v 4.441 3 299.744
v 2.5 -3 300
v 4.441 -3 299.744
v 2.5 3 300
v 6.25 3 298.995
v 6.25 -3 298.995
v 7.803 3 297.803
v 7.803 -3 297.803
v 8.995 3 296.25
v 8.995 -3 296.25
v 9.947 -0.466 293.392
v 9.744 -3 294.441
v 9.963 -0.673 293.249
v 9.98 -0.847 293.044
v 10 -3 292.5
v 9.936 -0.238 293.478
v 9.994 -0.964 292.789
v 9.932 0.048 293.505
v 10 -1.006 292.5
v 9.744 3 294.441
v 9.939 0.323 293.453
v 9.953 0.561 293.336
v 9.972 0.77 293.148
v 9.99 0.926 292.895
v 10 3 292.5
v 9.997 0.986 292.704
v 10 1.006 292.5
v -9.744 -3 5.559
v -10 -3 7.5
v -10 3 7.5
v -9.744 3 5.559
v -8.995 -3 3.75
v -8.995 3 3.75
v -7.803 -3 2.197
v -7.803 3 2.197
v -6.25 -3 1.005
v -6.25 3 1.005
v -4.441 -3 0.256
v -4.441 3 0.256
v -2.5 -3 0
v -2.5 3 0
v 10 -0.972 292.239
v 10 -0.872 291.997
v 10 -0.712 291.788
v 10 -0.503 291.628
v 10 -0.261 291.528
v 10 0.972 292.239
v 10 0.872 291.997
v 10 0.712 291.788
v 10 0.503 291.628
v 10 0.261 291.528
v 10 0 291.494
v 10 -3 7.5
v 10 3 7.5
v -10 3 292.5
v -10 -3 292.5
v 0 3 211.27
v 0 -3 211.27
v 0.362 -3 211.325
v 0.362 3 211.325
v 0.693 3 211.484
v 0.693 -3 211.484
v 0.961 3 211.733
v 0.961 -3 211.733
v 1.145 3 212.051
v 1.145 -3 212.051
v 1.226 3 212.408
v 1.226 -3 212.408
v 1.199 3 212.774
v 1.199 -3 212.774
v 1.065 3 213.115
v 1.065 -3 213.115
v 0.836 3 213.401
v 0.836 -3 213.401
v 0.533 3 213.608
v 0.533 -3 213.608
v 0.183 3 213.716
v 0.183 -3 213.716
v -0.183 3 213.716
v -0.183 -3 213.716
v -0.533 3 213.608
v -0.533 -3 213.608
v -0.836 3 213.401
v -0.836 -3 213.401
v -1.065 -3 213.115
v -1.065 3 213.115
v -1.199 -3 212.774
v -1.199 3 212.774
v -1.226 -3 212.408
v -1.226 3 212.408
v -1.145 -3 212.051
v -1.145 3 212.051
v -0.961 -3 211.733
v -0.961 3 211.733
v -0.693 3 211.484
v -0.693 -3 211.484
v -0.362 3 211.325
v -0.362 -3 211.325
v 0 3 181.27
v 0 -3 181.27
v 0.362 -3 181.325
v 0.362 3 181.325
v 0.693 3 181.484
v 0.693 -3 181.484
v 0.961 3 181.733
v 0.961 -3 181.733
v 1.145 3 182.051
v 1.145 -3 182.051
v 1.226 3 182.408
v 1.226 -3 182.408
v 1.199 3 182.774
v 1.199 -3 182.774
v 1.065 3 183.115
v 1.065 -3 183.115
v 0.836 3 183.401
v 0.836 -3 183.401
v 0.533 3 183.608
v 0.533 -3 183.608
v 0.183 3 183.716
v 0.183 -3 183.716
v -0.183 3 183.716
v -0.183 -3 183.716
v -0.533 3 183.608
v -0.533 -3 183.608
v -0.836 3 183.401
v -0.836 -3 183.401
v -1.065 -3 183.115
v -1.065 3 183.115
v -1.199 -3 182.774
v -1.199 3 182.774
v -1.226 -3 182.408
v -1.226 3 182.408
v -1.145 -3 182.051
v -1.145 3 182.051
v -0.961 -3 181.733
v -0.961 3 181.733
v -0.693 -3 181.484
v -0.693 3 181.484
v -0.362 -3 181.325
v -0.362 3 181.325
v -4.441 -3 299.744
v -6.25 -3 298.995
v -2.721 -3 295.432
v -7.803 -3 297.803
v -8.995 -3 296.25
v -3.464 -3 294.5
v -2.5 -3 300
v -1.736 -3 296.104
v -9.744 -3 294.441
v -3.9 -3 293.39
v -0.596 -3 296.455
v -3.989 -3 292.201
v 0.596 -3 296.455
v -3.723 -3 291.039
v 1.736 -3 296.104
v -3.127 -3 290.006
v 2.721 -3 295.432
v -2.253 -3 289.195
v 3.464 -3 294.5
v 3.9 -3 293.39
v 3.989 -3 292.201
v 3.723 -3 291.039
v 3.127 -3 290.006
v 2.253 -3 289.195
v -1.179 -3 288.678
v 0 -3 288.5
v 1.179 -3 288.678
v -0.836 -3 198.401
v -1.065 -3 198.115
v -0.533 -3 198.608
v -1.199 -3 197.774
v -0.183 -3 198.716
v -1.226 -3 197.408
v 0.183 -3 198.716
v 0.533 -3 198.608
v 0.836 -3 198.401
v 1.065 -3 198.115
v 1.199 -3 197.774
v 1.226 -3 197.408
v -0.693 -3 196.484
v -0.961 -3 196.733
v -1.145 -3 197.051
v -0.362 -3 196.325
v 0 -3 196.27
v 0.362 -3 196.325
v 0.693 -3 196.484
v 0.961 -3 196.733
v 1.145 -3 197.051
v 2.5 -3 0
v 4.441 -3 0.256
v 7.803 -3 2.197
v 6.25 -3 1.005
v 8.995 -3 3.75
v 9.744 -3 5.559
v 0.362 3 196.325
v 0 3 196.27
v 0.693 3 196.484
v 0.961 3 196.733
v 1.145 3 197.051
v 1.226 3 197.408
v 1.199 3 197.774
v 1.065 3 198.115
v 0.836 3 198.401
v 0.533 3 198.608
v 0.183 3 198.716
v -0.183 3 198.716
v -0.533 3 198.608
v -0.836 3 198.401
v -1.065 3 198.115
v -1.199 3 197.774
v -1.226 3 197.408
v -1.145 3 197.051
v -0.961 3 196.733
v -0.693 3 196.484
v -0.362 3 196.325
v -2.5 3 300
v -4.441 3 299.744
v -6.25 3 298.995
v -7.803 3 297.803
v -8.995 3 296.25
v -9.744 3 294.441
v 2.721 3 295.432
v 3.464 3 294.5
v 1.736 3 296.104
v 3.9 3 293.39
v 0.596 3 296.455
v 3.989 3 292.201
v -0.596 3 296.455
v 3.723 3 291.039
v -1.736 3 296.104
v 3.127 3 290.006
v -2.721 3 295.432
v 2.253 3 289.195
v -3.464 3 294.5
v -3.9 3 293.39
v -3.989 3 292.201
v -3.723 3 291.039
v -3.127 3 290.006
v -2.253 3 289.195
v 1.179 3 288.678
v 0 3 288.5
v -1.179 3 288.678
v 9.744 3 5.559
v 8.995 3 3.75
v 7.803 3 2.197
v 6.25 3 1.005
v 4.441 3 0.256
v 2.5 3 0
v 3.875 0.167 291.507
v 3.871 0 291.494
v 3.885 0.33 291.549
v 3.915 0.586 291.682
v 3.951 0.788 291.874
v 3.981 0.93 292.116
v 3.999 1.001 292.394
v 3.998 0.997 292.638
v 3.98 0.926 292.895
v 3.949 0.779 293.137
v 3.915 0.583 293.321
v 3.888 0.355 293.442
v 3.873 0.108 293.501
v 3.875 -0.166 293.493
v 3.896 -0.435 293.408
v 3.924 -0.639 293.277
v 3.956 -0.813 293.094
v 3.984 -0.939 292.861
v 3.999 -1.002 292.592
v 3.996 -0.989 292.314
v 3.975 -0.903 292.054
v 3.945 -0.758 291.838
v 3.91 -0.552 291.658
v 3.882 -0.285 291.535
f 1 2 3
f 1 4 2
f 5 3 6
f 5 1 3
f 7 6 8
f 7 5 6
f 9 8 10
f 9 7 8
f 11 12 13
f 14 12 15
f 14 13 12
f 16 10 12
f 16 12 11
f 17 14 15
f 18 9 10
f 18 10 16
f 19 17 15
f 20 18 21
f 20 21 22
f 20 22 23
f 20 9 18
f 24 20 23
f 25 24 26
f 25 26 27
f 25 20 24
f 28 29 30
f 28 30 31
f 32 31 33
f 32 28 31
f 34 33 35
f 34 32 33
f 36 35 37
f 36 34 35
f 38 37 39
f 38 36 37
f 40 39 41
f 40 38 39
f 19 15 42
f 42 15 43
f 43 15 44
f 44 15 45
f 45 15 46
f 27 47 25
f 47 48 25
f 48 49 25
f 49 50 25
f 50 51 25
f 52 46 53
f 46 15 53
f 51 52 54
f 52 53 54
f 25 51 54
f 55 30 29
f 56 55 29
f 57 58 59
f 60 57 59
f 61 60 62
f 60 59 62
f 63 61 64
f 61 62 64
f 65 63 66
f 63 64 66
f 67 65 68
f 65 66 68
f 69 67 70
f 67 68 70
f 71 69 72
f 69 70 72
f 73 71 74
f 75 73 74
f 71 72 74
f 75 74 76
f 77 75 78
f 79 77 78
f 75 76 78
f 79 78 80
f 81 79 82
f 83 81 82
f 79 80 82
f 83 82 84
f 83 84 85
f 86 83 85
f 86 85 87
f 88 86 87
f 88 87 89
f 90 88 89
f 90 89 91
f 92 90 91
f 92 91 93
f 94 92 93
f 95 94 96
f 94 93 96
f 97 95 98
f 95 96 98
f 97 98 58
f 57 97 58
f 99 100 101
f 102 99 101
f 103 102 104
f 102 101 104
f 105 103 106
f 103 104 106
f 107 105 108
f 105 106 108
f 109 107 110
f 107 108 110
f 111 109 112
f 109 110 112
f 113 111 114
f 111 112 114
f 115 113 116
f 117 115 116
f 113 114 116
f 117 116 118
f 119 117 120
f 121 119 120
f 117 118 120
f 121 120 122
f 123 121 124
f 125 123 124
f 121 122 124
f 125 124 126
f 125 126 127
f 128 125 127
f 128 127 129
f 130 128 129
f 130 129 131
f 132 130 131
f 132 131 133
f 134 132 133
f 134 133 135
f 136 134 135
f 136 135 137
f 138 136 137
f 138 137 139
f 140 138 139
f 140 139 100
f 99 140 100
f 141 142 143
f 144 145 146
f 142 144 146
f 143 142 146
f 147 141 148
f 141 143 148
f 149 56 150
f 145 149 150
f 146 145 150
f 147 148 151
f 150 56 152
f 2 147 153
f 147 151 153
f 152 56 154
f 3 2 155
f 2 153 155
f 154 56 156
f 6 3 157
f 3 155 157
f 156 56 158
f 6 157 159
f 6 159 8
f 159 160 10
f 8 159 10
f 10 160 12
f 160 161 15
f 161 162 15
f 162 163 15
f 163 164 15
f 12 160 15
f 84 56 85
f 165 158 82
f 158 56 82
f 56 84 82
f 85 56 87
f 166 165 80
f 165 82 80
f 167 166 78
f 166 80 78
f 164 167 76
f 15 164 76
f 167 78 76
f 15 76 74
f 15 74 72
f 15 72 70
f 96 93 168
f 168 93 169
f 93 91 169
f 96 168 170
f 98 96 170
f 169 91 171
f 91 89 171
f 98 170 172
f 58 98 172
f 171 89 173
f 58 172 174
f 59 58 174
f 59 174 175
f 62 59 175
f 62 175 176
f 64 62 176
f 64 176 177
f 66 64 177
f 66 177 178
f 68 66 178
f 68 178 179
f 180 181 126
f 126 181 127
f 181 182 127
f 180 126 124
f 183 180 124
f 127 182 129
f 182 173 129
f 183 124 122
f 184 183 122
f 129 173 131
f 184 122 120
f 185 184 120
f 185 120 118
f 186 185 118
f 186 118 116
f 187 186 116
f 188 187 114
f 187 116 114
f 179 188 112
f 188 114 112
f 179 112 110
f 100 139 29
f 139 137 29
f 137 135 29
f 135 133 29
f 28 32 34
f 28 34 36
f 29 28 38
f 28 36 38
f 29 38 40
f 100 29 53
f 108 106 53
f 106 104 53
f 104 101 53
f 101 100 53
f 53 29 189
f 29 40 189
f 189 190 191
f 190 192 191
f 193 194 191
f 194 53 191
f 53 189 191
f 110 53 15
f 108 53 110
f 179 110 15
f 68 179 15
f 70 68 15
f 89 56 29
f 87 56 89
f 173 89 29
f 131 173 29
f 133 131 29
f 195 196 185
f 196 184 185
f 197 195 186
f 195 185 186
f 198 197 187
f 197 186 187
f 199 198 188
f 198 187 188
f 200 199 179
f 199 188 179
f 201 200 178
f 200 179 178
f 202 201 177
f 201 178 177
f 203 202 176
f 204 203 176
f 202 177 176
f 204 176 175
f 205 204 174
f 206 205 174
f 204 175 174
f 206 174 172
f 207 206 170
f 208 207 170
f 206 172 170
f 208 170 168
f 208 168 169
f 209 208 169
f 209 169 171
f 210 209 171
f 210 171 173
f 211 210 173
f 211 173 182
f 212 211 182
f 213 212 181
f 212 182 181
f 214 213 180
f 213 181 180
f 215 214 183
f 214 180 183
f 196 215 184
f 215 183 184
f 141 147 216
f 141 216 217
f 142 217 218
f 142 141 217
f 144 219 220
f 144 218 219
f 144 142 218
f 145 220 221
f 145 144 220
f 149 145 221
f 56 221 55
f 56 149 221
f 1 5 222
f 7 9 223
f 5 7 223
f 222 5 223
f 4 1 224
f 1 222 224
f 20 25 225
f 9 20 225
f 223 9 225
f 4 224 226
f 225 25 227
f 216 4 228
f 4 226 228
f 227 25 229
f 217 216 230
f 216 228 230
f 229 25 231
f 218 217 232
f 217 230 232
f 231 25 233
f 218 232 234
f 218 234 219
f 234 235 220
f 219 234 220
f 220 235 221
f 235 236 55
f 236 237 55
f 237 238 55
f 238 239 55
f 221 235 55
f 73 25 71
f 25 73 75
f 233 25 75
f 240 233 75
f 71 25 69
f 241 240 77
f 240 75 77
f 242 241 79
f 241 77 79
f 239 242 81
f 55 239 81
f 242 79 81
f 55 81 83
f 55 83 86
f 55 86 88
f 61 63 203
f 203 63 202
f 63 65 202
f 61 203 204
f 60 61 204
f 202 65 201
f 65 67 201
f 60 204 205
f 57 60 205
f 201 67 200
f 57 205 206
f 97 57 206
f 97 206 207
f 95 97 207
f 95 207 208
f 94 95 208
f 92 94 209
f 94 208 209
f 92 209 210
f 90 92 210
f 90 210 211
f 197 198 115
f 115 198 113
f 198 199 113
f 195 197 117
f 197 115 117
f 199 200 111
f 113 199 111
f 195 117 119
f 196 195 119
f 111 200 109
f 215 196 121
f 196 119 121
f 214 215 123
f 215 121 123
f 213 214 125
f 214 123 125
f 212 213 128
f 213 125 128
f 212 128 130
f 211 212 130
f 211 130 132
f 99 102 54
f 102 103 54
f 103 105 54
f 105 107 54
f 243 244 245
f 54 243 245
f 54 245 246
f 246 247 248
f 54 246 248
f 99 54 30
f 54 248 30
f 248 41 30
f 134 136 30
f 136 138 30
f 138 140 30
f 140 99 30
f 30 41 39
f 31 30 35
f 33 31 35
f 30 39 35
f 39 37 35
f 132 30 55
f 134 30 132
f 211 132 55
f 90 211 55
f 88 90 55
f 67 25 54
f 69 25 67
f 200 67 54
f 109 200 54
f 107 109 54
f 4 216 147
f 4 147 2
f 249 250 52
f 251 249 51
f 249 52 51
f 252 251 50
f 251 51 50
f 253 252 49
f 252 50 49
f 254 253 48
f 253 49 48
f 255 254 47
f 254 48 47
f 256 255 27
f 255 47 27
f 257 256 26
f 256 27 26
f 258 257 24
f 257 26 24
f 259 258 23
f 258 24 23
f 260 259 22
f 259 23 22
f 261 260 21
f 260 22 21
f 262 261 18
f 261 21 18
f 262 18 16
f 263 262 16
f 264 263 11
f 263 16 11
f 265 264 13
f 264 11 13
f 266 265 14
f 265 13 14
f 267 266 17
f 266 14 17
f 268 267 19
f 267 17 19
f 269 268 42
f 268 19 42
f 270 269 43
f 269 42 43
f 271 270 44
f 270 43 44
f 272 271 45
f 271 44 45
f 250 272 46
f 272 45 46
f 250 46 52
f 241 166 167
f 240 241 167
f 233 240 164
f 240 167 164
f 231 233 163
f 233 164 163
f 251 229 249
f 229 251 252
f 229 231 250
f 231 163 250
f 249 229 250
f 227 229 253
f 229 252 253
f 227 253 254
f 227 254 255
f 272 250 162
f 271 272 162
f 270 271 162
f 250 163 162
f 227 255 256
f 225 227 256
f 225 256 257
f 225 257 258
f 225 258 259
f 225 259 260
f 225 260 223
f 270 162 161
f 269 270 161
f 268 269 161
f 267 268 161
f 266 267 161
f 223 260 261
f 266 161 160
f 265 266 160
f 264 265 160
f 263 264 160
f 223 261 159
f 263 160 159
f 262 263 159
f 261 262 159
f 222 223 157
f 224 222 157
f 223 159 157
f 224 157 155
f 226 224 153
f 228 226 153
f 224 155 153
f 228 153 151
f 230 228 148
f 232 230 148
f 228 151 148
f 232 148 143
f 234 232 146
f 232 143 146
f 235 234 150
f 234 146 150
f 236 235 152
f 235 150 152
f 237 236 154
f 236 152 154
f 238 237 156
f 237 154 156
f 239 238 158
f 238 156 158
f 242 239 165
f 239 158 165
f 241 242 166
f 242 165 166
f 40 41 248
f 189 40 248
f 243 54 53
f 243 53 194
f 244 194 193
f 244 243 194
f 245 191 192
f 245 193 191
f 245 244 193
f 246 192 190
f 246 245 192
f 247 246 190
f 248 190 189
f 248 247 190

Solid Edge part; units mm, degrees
sketch "Sketch1" plane through (60.3162, 60.3162, 0) normal (0, 0, 1) x (1, 0, 0)
  line L0 (-70.3162, -63.3162) -> (-50.3162, -63.3162)
  line L1 (-50.3162, -63.3162) -> (-50.3162, -57.3162)
  line L2 (-50.3162, -57.3162) -> (-70.3162, -57.3162)
  line L3 (-70.3162, -57.3162) -> (-70.3162, -63.3162)
  dimension "D1" = 20
  dimension "D2" = 6
extrude "Protrusion1" add sketch "Sketch1" along normal blind 300
fillet "Verrundung_1" radius 7.5 2 edges at (-10, 0, 300) (10, 0, 300)
fillet "Verrundung_2" radius 7.5 2 edges at (-10, 0, 0) (10, 0, 0)
hole "Bohrung_1" at (0, -3, 292.5) direction (0, 1, 0) diameter 8 end up to next
hole "Bohrung_2" at (0, -3, 212.5) direction (0, 1, 0) diameter 2.459 end up to next thread major 3 thread length 10
hole "Hole1" at (0, -3, 197.5) direction (0, 1, 0) diameter 2.459 end up to next thread major 3 thread length 10
hole "Hole2" at (0, -3, 182.5) direction (0, 1, 0) diameter 2.459 end up to next thread major 3 thread length 10
hole "Bohrung_5" at (10, 0, 292.5) direction (-1, 0, 0) diameter 2.013 end up to next thread major 2.5 thread length 8
properties material "Aluminium, 1060"
